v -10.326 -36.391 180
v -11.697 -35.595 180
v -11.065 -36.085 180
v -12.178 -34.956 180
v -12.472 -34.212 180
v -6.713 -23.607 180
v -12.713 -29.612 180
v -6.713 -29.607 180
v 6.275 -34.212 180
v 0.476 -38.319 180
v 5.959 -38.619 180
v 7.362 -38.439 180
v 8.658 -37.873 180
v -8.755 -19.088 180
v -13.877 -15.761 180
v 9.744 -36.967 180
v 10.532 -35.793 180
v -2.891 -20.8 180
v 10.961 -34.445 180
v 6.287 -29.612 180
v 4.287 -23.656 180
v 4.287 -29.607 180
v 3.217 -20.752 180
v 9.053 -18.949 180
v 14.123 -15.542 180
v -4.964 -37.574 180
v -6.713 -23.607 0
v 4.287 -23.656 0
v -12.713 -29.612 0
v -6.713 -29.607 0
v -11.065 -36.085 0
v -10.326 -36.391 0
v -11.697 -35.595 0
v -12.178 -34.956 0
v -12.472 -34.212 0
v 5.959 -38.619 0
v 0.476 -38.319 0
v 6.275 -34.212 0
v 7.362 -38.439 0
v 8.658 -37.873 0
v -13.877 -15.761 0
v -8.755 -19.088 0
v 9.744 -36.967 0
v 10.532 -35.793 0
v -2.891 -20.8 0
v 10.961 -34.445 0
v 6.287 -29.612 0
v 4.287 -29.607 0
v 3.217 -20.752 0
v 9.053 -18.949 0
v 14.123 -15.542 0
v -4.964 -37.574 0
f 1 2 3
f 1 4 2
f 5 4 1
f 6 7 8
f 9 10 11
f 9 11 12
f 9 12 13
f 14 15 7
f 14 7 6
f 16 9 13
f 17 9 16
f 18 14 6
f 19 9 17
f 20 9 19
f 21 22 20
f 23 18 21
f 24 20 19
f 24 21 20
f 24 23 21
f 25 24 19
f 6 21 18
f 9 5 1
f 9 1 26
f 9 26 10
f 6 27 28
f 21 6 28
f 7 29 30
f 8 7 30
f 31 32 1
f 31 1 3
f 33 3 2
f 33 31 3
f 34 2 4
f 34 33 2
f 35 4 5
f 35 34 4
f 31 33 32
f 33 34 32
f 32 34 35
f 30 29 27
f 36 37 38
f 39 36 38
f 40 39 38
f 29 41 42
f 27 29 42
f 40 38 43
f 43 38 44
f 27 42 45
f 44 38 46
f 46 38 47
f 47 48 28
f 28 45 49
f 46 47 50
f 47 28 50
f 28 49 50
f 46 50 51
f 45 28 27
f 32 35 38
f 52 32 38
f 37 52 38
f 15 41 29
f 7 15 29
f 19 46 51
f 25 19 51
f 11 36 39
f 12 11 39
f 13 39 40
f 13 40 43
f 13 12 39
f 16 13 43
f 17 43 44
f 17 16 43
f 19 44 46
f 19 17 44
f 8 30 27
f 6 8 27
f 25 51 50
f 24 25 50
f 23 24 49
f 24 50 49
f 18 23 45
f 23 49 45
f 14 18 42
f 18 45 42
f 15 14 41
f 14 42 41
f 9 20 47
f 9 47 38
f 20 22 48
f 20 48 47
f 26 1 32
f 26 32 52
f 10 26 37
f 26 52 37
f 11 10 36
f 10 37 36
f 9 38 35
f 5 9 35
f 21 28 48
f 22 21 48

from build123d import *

# Parameters (mm, degrees)
F1_DEPTH    = 180
F2_R        = 5
F3_T1_DEPTH = 191.1494898741


# Not quite as in the source:
# - a fillet or chamfer that OpenCascade refuses, or shapes differently, is made with other operations: its cross-section is extruded or revolved along the edge and cut away or added


with BuildPart() as f1:
    # F0 (on Top) → F1 (new body)
    with BuildSketch(Plane.XY):
        with BuildLine():
            ThreePointArc((14.1226732436, -15.5418821401), (0.1645874713, -20.9993550131), (-13.8773267564, -15.7613388421))
            Line((-13.8773267564, -15.7613388421), (-12.7134246975, -29.6120676683))
            Line((-12.7134246975, -29.6120676683), (-6.7134246975, -29.6071426253))
            Line((-6.7134246975, -29.6071426253), (-6.7134246975, -23.6071426253))
            Line((-6.7134246975, -23.6071426253), (4.2865298223, -23.6563930556))
            Line((4.2865298223, -23.6563930556), (4.2865298223, -29.6071426253))
            Line((4.2865298223, -29.6071426253), (6.2865237583, -29.6120676683))
            Line((6.2865237583, -29.6120676683), (6.2751961593, -34.2120537211))
            Line((6.2751961593, -34.2120537211), (-12.4721404334, -34.2120676683))
            Line((-12.4721404334, -34.2120676683), (-12.4721404334, -35.7862083692))
            ThreePointArc((-12.4721404334, -35.7862083692), (-1.2161640349, -38.1355598231), (10.2751961593, -38.5418821401))
            Line((10.2751961593, -38.5418821401), (14.1226732436, -15.5418821401))
        make_face()
    extrude(amount=F1_DEPTH)

    # F2
    f2_edges = [f1.edges().sort_by_distance(p)[0] for p in [
        (10.275196, -38.541882, 90),
    ]]
    fillet(f2_edges, radius=F2_R)

    # F3: fillet of radius 3 on 1 edges, made by hand

    # F3_s2 → F3_t1 (cut)
    with BuildSketch(Plane.XY.offset(-5.5747449371)):
        with BuildLine():
            ThreePointArc((-10.3257108334, -36.3905964487), (-11.6973730961, -35.5953820953), (-12.4721404334, -34.2120676683))
            Line((-12.4721404334, -34.2120676683), (-12.4721404334, -35.7862083692))
            ThreePointArc((-12.4721404334, -35.7862083692), (-11.4014196416, -36.0972596534), (-10.3257108334, -36.3905964487))
        make_face()
    extrude(amount=F3_T1_DEPTH, mode=Mode.SUBTRACT)


solid = f1.part
